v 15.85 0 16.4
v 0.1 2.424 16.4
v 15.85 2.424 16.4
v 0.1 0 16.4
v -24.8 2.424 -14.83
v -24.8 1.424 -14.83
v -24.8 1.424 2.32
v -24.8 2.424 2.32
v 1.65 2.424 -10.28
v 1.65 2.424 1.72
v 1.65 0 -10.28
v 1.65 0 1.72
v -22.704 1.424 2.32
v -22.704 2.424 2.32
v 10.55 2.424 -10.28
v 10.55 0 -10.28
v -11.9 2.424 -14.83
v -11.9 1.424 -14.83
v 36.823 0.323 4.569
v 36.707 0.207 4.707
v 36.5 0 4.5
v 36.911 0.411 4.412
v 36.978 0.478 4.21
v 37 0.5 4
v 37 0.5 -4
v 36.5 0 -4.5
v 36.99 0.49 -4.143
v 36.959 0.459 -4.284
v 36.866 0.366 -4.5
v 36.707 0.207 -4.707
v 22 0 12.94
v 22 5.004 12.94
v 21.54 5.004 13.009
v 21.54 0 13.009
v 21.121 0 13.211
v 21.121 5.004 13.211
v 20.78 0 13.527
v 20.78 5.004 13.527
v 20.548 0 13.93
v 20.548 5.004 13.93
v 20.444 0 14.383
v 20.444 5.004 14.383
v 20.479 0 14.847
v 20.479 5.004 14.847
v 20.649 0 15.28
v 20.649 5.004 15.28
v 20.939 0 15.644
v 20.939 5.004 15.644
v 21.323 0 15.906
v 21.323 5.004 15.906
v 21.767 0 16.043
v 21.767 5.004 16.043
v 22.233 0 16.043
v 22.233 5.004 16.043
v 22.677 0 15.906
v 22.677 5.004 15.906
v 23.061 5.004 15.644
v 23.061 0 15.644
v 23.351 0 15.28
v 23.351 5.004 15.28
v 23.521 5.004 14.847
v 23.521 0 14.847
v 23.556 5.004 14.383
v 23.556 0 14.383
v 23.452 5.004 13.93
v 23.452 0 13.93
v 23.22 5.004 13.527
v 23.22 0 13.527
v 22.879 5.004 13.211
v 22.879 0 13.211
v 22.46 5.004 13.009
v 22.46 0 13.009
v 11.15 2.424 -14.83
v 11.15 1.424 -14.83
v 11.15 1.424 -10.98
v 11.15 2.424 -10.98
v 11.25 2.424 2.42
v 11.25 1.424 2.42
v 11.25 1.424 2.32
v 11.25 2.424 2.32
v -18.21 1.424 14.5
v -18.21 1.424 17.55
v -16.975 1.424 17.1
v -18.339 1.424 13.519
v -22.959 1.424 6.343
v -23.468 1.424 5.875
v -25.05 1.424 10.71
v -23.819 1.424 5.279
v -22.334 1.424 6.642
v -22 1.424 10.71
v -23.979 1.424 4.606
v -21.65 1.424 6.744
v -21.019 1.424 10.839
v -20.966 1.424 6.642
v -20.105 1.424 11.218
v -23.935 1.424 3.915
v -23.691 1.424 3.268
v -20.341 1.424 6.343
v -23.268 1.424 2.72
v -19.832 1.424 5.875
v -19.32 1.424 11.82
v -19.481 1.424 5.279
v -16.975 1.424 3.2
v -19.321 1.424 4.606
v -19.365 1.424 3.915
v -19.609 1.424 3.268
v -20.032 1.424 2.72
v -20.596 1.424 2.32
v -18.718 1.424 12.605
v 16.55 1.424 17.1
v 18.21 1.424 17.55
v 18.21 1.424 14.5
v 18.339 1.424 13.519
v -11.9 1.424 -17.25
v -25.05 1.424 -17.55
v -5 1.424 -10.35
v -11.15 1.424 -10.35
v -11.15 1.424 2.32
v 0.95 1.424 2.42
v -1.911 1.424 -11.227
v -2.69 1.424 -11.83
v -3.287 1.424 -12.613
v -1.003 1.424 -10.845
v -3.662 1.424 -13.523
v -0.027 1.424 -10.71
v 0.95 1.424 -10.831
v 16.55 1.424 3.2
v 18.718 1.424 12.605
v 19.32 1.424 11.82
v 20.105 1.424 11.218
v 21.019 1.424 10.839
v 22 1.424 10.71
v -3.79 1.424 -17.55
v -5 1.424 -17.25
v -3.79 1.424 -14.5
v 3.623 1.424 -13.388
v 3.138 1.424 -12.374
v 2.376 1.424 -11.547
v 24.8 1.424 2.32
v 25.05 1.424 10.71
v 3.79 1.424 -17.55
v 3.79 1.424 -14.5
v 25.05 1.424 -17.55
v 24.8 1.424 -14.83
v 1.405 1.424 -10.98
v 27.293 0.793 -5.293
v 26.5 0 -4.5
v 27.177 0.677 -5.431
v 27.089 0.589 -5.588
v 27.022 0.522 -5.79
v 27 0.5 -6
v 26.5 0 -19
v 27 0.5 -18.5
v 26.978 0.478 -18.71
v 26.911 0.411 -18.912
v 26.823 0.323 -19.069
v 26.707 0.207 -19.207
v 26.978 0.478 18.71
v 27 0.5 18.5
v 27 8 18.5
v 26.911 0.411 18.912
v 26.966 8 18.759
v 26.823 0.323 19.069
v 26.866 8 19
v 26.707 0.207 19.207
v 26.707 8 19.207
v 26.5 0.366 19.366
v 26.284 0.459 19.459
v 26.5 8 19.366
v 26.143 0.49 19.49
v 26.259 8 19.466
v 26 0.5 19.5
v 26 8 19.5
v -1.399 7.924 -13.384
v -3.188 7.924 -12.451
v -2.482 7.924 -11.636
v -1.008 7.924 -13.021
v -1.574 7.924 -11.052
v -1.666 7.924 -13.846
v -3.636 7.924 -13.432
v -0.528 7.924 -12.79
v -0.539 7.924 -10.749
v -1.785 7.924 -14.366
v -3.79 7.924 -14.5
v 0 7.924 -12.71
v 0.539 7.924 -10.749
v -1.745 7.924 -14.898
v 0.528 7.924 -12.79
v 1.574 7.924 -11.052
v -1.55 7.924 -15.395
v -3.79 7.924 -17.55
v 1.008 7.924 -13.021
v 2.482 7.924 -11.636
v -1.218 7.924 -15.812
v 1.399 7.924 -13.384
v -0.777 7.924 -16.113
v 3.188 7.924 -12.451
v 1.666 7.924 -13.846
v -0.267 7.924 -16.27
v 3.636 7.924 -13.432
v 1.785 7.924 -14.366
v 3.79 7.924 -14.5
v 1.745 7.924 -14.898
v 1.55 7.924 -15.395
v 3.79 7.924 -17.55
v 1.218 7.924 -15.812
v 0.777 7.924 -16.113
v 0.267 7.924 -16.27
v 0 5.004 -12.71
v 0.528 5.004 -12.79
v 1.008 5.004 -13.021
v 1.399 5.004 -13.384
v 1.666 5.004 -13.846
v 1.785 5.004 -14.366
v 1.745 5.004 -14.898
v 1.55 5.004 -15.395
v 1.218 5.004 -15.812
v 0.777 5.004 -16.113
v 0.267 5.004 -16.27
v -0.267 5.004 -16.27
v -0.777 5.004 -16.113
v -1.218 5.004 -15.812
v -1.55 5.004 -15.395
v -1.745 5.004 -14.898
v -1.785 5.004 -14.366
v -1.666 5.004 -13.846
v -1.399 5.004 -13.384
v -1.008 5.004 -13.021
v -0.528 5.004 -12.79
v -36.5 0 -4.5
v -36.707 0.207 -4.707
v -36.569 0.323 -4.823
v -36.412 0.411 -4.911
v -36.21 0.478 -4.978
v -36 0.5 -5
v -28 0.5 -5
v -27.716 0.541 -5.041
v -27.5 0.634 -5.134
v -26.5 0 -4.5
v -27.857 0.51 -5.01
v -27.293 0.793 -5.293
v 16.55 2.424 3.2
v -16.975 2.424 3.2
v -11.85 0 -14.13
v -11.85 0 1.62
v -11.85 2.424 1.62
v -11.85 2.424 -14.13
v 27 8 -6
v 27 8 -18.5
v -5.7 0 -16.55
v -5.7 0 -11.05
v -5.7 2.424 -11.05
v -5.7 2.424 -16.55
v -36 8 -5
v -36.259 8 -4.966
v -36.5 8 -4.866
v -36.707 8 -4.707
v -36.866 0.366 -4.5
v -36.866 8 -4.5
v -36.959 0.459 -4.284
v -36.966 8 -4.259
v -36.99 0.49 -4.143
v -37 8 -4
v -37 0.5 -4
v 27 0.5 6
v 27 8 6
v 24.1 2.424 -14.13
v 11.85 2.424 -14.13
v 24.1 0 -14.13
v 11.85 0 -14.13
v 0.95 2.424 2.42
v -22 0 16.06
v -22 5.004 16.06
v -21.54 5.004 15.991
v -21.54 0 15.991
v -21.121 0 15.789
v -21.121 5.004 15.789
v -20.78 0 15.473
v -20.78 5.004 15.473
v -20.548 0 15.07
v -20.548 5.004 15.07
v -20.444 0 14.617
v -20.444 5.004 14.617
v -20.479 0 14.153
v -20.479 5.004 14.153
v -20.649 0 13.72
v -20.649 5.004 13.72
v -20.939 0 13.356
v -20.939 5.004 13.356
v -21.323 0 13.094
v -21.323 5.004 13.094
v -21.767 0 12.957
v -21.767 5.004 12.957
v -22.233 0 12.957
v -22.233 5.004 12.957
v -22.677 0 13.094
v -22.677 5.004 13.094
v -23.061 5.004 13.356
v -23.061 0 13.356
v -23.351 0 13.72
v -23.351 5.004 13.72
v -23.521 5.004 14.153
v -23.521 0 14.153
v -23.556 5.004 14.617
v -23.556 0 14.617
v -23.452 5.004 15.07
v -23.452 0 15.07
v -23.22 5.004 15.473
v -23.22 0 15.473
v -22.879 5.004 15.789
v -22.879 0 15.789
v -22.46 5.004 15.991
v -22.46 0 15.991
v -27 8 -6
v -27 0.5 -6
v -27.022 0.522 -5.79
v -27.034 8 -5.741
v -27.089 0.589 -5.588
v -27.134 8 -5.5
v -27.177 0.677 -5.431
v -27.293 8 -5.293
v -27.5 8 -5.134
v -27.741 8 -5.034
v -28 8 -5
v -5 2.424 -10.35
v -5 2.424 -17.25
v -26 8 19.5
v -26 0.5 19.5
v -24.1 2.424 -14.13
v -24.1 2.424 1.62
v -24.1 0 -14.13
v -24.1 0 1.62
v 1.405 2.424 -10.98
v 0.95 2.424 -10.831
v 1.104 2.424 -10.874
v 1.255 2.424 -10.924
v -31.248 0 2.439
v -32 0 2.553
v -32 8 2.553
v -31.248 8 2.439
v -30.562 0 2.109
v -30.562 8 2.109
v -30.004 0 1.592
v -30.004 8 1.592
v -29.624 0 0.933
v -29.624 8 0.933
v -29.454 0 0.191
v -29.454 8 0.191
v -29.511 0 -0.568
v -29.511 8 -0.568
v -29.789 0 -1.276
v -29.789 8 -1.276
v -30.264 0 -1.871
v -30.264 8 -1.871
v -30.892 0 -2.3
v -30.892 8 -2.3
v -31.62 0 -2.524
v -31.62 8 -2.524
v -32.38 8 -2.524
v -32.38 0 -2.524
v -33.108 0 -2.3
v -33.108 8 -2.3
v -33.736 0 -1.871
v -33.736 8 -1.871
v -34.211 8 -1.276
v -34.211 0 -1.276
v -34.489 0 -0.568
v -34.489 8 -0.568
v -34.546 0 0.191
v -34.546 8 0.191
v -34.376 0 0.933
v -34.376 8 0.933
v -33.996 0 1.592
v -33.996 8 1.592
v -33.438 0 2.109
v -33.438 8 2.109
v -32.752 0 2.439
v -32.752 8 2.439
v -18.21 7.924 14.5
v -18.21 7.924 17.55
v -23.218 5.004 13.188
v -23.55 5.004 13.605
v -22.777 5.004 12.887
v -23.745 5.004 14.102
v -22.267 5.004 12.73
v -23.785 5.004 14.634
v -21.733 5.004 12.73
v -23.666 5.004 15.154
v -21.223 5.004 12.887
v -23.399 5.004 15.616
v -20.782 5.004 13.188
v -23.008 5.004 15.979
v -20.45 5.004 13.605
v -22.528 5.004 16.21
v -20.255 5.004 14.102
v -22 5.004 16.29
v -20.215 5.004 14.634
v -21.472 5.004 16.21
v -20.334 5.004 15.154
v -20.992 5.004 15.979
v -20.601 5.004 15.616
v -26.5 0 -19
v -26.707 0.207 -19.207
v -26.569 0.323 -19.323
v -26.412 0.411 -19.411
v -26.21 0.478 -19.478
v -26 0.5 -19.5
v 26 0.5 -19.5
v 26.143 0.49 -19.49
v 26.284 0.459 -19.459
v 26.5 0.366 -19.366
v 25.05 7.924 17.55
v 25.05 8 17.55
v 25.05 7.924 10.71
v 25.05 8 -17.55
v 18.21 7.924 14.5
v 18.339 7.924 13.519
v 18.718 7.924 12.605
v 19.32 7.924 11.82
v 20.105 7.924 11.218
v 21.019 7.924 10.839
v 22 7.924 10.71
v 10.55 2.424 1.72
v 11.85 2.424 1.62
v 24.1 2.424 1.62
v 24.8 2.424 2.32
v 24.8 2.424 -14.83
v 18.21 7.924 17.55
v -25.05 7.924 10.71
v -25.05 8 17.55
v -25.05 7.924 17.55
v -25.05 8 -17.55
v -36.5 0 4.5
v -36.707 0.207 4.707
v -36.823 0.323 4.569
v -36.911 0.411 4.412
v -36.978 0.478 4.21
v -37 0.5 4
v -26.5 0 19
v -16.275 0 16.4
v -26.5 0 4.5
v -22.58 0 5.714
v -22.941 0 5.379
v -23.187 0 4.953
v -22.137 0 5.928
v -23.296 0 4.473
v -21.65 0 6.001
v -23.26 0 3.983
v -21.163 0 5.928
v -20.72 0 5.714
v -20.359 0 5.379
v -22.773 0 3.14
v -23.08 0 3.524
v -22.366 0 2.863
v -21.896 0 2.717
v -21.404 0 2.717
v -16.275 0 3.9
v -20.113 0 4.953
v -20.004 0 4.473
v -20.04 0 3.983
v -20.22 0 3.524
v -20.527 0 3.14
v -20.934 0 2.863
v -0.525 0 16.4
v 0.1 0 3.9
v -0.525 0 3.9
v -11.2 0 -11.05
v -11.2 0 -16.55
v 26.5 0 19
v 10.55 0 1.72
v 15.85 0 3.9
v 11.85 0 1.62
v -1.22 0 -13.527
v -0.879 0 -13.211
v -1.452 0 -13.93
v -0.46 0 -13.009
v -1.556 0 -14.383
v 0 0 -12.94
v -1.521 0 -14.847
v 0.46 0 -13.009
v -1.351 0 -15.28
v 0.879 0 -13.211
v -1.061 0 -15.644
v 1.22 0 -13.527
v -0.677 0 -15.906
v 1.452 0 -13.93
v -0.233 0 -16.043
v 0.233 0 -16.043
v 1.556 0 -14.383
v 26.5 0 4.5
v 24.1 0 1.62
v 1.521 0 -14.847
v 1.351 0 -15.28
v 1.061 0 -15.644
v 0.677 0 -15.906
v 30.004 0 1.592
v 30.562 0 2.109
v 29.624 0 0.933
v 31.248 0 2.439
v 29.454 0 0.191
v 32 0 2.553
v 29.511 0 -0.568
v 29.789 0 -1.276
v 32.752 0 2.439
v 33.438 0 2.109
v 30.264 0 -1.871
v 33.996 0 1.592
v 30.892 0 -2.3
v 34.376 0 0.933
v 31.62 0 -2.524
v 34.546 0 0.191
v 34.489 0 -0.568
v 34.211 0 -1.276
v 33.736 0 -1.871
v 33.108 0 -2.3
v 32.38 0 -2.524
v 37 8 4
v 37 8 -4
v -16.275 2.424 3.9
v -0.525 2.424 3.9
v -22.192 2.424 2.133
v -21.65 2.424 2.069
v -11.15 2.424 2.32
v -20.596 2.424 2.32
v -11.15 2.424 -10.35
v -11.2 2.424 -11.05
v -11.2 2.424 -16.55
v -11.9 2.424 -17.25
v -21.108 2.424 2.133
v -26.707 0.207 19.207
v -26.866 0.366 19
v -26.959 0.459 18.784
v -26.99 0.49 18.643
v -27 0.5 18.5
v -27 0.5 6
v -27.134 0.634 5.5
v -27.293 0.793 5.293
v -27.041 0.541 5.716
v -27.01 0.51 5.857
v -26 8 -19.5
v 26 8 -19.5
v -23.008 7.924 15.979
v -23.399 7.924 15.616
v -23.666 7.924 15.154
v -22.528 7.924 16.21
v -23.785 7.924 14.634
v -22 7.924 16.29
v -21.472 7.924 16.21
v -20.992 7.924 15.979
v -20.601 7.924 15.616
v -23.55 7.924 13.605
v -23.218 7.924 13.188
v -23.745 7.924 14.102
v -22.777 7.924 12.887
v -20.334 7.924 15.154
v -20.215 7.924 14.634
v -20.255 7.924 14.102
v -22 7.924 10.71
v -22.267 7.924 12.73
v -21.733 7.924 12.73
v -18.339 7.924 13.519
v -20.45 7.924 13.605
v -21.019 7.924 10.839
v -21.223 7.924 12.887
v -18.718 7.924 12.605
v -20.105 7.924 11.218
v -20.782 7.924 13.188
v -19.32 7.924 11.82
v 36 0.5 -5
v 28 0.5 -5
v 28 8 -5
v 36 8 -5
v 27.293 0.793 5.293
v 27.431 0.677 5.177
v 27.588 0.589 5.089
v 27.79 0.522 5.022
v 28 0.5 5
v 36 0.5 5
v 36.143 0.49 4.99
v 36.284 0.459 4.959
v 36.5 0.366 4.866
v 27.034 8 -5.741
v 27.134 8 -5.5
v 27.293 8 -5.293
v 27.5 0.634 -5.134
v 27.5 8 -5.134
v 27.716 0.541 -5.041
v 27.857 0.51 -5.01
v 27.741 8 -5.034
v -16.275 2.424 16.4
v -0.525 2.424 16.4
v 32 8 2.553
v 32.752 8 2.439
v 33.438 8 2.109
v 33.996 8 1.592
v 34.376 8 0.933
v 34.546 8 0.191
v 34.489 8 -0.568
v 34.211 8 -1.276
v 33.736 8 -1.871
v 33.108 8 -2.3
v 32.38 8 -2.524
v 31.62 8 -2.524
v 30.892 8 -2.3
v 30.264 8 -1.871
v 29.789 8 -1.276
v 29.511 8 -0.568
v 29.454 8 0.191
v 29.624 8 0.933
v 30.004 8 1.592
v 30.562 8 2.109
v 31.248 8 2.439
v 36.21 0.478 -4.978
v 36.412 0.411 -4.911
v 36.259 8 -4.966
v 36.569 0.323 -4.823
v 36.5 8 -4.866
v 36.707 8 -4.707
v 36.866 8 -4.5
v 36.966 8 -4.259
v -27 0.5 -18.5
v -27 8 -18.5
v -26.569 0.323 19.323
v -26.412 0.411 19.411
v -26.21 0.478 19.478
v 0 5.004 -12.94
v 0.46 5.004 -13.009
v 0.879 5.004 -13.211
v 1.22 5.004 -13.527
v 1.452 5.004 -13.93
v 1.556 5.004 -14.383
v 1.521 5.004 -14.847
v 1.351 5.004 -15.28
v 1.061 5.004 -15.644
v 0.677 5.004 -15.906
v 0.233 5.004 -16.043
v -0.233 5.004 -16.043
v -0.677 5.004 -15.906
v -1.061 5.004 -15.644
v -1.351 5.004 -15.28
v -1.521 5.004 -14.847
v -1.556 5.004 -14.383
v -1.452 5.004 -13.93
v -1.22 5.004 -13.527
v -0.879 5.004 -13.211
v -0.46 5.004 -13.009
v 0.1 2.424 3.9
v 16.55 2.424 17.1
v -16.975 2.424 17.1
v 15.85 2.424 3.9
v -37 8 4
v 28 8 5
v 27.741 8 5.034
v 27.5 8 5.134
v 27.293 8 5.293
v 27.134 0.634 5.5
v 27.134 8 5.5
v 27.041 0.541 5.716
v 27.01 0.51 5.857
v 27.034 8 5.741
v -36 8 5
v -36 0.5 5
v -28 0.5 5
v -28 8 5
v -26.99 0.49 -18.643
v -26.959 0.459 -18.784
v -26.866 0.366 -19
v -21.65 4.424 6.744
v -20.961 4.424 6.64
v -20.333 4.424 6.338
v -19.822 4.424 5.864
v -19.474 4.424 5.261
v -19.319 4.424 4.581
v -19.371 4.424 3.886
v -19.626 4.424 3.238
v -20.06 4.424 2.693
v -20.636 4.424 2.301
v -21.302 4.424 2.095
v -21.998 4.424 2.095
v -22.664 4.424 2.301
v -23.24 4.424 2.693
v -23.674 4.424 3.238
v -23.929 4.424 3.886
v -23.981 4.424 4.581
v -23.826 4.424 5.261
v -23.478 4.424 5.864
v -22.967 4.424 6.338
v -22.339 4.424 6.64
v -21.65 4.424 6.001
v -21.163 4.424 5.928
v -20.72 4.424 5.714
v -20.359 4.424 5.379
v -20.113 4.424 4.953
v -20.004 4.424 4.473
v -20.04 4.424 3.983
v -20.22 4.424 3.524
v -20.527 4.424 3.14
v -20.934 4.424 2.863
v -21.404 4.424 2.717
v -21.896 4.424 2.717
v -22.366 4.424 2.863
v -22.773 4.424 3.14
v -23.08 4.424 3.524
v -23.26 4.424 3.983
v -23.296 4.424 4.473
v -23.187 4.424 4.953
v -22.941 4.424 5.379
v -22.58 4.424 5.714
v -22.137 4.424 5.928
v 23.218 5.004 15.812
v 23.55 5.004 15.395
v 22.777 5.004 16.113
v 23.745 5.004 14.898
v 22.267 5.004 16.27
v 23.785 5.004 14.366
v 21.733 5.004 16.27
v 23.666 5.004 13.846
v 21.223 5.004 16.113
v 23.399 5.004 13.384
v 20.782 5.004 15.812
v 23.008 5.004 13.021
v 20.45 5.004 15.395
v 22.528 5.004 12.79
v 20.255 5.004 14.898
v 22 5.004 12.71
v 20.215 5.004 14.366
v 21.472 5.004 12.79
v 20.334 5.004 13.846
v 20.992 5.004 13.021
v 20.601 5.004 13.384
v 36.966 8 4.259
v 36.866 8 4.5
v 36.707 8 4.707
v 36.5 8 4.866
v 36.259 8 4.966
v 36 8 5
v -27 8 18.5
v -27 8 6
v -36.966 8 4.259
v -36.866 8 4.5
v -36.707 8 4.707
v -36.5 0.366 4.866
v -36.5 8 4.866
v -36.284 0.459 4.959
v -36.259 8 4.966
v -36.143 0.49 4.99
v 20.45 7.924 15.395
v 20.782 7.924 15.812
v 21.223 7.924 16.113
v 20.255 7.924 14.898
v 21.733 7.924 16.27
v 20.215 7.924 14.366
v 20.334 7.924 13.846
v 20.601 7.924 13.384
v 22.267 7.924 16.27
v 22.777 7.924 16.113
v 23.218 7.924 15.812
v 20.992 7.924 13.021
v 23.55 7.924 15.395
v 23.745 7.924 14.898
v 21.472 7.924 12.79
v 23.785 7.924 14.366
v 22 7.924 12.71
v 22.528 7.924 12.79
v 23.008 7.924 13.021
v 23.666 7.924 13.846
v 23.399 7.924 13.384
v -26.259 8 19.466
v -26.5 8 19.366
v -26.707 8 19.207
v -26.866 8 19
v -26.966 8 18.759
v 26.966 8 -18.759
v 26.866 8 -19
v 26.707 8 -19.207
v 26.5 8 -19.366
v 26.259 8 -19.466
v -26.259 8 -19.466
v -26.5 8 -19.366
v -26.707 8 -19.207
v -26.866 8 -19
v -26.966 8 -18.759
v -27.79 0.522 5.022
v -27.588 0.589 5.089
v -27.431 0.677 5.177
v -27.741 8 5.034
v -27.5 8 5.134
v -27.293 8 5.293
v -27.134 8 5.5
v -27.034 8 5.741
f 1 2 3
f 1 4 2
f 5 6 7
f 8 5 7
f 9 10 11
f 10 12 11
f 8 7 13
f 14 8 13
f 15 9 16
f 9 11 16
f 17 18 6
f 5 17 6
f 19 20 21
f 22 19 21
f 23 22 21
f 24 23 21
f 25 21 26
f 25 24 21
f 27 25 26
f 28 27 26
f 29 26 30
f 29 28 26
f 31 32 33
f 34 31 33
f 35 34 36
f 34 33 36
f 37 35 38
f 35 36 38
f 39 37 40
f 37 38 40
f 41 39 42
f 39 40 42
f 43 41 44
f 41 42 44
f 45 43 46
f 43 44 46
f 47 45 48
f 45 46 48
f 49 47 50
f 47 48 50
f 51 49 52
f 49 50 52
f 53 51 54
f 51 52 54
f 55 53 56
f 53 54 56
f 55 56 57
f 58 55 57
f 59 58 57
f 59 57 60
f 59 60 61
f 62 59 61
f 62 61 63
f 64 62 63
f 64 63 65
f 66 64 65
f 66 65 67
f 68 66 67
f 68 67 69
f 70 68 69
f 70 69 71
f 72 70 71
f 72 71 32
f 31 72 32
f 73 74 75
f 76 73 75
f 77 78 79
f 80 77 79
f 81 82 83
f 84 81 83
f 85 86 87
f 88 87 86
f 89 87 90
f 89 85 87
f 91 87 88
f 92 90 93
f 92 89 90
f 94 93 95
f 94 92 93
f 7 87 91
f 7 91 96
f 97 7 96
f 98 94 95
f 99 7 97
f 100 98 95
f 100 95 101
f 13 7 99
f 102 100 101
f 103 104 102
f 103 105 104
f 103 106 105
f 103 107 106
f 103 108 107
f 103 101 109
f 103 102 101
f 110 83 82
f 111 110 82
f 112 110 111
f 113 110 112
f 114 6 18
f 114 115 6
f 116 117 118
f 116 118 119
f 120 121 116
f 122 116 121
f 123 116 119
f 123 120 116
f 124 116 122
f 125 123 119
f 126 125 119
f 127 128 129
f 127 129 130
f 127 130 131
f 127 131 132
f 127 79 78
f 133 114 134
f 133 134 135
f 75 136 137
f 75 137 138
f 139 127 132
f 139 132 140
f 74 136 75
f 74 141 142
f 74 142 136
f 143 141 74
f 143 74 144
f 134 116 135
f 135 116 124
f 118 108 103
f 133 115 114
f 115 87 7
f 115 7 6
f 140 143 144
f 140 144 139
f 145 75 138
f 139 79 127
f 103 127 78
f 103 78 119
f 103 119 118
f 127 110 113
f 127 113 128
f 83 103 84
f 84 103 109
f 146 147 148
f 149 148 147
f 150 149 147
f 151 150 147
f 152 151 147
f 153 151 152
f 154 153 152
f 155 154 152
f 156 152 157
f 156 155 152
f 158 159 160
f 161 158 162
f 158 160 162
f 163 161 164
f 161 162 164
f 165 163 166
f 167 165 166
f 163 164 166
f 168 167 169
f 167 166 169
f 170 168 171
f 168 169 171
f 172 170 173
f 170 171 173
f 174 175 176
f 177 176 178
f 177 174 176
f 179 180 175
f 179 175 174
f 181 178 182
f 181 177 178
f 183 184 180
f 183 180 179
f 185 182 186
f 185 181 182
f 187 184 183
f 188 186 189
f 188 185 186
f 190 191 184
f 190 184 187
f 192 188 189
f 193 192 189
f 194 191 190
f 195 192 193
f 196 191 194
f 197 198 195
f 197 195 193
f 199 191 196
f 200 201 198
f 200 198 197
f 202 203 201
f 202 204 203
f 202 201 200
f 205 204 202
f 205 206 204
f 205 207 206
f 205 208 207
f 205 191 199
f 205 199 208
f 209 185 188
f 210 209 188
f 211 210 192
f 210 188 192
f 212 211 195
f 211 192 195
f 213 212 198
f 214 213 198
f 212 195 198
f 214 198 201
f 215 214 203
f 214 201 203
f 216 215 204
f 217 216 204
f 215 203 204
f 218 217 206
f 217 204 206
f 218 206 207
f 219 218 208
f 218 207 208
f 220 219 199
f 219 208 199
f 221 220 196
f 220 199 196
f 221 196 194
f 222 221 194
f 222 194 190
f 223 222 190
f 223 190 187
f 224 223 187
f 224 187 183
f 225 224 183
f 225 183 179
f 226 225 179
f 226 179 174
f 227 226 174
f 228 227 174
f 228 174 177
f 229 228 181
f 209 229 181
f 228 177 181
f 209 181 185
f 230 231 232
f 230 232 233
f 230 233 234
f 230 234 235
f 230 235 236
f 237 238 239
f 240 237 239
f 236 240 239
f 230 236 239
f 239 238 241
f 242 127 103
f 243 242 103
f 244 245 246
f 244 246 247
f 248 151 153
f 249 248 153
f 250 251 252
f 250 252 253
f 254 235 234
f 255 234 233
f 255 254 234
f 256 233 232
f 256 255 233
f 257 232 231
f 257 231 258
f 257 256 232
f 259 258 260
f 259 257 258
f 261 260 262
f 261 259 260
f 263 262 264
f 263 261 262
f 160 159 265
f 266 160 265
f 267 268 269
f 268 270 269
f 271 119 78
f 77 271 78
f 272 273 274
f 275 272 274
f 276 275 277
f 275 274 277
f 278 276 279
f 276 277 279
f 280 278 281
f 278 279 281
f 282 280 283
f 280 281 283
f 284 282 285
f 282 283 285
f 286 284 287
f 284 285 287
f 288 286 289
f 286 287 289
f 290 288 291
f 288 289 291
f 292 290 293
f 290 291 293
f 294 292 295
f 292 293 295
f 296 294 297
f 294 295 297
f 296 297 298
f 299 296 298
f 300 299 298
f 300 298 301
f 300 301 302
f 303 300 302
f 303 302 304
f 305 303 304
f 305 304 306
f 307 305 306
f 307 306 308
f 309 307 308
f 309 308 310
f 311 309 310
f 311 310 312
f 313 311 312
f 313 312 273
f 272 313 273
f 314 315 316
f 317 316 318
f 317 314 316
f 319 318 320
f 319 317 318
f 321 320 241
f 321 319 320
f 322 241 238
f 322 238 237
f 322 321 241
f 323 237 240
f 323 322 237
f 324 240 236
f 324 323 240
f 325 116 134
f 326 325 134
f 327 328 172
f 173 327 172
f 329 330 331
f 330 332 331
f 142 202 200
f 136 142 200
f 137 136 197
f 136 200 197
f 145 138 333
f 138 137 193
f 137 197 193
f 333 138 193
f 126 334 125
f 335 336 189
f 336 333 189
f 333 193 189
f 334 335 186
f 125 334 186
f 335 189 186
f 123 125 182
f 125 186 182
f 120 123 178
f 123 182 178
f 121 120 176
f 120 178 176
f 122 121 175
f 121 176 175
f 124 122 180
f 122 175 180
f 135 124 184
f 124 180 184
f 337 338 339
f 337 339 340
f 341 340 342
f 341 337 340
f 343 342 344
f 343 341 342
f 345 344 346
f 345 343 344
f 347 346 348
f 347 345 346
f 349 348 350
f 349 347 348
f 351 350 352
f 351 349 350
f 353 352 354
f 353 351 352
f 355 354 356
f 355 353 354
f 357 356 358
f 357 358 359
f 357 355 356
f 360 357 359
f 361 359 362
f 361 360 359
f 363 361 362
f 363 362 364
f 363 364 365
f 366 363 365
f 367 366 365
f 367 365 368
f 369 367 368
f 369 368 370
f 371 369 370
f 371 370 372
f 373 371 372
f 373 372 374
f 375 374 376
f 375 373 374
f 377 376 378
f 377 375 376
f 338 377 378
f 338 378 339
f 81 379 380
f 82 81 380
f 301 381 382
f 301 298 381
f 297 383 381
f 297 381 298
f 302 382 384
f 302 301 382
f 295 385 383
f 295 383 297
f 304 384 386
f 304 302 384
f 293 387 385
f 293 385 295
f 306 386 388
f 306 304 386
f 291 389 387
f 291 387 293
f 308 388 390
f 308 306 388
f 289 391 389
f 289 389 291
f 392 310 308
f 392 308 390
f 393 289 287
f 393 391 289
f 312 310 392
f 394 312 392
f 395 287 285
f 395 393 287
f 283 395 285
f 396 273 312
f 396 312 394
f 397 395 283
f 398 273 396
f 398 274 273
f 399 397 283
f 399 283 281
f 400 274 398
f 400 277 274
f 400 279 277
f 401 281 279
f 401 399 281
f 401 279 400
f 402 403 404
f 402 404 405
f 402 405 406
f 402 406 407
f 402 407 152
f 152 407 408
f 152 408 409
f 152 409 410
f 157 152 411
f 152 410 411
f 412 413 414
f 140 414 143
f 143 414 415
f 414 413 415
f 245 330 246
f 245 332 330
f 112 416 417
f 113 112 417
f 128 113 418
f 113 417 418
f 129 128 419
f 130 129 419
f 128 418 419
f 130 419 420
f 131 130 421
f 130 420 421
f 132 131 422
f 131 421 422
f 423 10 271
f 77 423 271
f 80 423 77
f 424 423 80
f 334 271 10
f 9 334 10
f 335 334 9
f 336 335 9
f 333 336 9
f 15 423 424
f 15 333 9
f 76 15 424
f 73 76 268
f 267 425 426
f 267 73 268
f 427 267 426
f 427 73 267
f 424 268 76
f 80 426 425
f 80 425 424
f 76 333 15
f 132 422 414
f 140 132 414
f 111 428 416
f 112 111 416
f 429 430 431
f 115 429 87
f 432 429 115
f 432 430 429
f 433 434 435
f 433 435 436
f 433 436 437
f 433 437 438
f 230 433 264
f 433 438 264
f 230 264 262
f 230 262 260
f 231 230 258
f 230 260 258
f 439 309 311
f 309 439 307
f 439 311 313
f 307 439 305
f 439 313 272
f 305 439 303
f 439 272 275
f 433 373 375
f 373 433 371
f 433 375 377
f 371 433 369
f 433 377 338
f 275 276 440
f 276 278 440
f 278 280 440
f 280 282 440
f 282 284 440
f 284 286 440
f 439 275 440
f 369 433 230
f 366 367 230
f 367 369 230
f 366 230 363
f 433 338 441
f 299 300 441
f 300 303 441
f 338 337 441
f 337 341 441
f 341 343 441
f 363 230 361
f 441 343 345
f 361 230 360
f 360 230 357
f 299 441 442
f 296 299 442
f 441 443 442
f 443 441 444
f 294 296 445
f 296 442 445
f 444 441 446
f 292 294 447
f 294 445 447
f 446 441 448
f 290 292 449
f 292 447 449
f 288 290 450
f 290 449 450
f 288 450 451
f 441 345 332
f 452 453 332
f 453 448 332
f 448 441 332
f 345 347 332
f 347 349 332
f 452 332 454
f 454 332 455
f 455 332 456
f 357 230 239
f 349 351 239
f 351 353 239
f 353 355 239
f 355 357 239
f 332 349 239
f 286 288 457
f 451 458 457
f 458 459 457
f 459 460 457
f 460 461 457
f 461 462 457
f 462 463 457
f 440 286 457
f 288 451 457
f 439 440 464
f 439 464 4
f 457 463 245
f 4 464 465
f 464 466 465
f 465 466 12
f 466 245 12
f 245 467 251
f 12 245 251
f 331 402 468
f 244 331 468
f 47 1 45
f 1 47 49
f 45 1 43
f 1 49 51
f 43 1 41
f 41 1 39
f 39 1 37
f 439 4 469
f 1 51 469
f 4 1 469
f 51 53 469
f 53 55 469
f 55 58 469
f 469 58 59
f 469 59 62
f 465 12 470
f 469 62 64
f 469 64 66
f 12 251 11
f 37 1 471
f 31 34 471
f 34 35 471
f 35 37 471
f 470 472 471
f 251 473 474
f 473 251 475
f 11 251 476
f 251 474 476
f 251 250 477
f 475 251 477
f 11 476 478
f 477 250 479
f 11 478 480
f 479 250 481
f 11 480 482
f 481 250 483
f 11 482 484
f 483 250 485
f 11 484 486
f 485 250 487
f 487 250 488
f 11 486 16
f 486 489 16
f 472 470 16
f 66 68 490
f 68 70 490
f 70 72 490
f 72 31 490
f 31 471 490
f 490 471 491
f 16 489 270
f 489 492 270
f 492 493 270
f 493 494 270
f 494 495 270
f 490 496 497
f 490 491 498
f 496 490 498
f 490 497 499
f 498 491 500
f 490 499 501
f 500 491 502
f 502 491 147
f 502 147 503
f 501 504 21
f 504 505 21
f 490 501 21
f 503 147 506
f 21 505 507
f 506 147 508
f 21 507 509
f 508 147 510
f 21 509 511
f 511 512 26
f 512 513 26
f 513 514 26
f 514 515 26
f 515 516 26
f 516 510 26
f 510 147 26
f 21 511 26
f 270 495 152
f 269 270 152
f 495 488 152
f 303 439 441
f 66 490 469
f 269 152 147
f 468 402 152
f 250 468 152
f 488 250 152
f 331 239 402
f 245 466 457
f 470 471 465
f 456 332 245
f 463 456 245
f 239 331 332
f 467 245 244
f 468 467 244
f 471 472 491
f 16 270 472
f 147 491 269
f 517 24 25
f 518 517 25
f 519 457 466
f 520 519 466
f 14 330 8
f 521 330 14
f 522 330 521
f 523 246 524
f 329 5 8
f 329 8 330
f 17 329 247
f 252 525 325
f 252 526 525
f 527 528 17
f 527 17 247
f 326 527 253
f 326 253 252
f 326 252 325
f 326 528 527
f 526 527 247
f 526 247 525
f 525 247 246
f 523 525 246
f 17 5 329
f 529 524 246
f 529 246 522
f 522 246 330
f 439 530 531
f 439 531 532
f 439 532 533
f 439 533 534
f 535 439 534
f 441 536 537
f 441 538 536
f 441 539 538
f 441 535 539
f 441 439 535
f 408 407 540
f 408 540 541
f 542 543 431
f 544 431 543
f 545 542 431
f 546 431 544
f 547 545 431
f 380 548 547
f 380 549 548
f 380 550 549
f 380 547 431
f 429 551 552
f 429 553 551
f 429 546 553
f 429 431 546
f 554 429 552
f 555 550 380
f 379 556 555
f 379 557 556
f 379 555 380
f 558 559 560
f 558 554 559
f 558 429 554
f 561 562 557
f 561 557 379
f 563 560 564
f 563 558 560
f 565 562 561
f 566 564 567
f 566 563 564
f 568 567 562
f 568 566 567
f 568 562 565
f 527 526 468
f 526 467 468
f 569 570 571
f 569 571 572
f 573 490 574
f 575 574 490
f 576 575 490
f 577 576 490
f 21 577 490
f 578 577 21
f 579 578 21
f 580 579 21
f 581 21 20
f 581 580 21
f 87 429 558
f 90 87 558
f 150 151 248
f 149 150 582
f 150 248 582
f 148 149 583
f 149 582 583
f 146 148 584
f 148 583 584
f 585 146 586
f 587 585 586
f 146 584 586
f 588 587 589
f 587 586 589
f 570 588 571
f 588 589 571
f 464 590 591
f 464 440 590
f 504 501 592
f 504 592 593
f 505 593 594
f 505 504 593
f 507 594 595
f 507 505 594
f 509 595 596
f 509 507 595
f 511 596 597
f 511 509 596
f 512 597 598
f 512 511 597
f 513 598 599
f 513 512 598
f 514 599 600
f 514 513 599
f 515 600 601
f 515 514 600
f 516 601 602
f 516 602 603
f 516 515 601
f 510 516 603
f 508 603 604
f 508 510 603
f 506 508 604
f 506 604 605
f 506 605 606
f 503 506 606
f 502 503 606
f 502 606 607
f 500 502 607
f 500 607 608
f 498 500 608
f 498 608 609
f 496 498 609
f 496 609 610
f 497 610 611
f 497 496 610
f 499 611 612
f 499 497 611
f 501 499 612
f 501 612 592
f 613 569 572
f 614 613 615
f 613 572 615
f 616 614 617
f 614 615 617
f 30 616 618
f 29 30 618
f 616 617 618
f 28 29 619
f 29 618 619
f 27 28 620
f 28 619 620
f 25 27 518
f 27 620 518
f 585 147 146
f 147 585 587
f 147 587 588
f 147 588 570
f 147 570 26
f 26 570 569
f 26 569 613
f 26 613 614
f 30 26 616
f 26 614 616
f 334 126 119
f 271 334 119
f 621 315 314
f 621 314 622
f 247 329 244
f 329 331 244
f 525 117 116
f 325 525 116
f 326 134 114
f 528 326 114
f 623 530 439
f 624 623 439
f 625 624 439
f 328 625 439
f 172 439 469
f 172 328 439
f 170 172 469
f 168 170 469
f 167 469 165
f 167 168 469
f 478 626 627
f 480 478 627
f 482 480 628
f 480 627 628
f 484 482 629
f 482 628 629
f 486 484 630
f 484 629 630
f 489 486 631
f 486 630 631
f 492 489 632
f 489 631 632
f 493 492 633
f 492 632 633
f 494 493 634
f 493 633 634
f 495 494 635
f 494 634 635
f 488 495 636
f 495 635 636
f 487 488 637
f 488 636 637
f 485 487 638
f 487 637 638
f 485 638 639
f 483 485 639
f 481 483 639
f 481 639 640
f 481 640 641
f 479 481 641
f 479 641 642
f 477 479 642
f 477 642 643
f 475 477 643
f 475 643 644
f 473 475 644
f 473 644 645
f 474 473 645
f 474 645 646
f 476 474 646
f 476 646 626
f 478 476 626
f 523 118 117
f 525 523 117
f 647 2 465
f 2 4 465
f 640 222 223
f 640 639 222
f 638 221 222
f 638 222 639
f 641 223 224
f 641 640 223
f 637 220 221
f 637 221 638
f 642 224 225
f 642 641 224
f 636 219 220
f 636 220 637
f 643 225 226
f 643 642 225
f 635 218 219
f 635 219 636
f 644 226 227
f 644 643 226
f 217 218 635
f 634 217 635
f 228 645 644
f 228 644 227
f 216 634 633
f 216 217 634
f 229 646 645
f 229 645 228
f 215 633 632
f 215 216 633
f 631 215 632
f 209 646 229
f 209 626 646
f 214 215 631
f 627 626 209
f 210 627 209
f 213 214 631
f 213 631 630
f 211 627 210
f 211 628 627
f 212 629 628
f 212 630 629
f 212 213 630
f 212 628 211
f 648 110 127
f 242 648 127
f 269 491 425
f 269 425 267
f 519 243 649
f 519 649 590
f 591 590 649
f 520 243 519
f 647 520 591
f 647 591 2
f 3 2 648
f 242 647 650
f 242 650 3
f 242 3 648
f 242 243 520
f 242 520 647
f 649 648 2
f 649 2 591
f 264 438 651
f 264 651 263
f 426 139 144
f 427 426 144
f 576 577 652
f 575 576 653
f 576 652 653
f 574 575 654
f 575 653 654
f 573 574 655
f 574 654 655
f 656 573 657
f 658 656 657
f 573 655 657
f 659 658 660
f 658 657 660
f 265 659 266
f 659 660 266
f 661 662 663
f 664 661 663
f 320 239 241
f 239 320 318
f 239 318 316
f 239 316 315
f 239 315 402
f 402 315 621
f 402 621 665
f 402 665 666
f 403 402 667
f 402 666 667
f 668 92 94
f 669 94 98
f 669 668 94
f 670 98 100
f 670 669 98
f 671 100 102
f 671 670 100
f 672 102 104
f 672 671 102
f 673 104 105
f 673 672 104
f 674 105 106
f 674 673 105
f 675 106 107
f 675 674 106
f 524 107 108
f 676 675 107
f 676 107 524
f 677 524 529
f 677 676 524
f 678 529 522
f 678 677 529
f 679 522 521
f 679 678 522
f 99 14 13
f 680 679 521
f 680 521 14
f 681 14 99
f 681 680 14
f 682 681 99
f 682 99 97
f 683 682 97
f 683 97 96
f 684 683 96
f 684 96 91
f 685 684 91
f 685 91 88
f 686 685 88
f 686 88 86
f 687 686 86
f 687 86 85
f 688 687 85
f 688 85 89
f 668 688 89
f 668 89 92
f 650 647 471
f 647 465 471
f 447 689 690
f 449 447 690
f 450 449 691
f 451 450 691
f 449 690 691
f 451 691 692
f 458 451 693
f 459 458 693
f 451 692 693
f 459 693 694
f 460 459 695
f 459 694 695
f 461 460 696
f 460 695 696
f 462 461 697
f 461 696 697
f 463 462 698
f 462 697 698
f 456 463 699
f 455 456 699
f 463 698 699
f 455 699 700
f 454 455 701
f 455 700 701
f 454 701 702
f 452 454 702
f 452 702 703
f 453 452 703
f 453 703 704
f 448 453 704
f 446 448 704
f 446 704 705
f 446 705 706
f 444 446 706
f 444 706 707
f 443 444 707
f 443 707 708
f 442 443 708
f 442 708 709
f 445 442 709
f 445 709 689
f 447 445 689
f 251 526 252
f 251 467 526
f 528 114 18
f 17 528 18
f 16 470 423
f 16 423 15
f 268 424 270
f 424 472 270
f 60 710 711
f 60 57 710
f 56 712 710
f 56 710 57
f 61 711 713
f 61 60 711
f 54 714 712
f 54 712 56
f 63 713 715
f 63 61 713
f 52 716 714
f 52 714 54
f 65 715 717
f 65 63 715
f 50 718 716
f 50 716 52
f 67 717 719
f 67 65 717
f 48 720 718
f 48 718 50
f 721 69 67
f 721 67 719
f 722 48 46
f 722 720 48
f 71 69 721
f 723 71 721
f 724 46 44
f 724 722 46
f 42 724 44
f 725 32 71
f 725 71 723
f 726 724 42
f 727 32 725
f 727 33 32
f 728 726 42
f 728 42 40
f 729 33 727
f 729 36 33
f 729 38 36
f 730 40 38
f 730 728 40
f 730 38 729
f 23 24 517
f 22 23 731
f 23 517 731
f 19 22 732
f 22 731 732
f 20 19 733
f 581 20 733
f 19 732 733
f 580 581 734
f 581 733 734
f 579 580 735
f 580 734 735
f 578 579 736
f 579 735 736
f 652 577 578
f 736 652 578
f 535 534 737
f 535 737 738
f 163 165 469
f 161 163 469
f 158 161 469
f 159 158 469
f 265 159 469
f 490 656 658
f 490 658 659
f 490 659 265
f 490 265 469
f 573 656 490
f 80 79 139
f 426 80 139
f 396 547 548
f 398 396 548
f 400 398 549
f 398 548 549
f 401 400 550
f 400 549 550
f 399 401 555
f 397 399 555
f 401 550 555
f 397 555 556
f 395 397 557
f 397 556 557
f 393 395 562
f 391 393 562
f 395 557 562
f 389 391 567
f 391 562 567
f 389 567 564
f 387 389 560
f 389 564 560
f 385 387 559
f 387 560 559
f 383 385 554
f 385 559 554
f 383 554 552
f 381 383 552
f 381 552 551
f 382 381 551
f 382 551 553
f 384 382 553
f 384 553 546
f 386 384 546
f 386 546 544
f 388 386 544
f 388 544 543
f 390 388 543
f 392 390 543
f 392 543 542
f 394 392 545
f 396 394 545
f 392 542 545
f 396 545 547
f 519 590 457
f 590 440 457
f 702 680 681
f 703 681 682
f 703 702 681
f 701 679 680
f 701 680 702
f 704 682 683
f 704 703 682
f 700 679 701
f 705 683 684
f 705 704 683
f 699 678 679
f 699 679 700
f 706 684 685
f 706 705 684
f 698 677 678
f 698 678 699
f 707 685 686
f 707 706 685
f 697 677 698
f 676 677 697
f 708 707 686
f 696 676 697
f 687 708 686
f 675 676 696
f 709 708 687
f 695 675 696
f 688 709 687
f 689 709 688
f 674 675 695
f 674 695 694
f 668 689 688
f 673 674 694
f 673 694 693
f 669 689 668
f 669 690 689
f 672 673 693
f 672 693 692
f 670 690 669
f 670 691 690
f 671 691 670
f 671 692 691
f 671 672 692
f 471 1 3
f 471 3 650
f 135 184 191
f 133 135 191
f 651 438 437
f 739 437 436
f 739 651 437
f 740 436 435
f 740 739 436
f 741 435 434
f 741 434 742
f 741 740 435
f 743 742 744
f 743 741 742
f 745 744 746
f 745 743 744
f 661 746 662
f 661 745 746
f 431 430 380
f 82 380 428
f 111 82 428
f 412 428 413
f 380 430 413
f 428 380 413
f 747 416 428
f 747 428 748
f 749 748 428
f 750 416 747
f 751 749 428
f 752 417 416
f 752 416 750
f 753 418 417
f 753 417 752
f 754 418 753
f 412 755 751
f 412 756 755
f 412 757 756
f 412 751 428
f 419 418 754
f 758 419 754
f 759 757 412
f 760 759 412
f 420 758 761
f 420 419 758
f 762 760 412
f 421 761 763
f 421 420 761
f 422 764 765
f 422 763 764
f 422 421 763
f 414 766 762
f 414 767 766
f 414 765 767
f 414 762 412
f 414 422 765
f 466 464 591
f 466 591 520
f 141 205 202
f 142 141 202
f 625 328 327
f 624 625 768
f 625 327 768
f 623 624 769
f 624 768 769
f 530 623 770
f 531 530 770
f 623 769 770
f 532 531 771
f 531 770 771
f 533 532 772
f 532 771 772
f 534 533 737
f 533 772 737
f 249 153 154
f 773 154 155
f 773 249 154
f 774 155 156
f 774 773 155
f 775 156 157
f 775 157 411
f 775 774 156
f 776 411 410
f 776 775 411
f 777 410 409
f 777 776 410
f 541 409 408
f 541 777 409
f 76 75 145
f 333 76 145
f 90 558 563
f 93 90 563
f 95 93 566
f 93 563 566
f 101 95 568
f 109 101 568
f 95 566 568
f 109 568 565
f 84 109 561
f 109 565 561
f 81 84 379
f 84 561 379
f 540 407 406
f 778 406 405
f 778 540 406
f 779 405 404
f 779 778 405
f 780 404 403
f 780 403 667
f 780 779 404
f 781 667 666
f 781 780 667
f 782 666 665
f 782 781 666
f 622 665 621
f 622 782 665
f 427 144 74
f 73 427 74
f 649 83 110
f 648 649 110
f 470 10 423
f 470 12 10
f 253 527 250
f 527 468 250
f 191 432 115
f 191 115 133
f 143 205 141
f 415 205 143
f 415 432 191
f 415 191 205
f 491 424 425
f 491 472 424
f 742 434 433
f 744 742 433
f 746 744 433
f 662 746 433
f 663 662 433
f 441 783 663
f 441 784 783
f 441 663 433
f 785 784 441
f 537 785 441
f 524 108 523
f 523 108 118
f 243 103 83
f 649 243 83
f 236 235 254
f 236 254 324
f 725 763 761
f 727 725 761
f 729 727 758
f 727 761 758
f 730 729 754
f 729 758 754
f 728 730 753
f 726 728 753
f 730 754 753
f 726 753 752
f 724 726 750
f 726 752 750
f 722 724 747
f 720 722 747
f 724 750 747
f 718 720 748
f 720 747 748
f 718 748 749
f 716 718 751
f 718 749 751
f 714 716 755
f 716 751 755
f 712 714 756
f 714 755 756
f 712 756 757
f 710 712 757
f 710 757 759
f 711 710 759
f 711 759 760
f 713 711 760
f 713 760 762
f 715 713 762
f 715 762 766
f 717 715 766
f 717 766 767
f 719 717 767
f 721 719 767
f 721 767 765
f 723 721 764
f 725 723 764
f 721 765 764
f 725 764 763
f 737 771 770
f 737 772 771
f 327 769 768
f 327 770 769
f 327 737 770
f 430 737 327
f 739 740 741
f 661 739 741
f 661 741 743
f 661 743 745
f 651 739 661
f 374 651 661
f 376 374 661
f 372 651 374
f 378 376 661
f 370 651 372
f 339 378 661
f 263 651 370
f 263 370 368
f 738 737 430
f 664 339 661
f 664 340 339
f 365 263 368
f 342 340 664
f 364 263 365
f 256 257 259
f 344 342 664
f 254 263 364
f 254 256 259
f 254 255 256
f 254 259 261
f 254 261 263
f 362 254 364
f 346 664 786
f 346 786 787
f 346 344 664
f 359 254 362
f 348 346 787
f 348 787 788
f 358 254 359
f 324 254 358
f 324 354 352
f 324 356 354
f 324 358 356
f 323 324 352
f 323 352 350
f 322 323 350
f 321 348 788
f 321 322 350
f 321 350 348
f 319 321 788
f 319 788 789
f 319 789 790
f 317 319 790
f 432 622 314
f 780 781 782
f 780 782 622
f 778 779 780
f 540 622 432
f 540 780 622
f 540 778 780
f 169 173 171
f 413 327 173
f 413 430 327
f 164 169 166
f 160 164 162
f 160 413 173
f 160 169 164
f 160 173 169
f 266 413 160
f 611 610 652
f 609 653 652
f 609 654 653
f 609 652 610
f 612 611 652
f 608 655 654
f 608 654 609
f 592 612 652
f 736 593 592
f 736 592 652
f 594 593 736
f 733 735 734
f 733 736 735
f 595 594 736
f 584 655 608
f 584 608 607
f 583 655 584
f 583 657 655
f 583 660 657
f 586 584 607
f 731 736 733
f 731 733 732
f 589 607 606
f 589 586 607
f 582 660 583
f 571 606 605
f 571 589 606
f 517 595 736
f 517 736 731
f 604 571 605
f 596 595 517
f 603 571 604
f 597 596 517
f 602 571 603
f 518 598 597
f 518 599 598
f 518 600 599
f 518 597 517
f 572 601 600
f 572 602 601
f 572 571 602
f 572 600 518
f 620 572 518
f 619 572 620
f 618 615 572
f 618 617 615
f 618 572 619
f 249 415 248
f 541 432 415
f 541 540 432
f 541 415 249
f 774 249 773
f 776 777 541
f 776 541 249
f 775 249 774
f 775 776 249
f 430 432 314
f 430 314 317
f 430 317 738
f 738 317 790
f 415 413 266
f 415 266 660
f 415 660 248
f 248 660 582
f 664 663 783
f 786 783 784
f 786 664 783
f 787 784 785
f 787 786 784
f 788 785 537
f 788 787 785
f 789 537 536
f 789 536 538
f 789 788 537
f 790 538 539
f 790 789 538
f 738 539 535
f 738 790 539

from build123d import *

# Parameters (mm, degrees)
SKETCH1_W           = 54
SKETCH1_H           = 39
SKETCH1_W_2         = 10
SKETCH1_H_2         = 10
SKETCH1_R           = 2.5527
BOSS_EXTRUDE1_DEPTH = 8
SKETCH2_W           = 50.1
SKETCH2_H           = 35.1
CUT_EXTRUDE1_DEPTH  = 0.0762
CUT_EXTRUDE2_DEPTH  = 6.5
SKETCH4_R           = 1.56
CUT_EXTRUDE3_DEPTH  = 43.568023286
SKETCH5_R           = 1.79
CUT_EXTRUDE4_DEPTH  = 2.92
SKETCH6_W           = 12.25
SKETCH6_H           = 15.75
SKETCH6_W_2         = 15.75
SKETCH6_H_2         = 12.5
SKETCH6_W_3         = 5.5
SKETCH6_H_3         = 5.5
CUT_EXTRUDE5_DEPTH  = 43.337883821
SKETCH7_W           = 8.9
SKETCH7_H           = 12
CUT_EXTRUDE6_DEPTH  = 43.337883821
CHAMFER1_SIZE       = 0.5
SKETCH9_R           = 1.651
CUT_EXTRUDE8_DEPTH  = 43.337883821
BOSS_EXTRUDE2_START = 3
SKETCH10_R          = 2.3375
SKETCH10_R_2        = 1.651
BOSS_EXTRUDE2_DEPTH = 3
SKETCH11_W          = 5.5
SKETCH11_H          = 5.5
SKETCH11_W_2        = 12.25
SKETCH11_H_2        = 15.75
SKETCH11_W_3        = 8.9
SKETCH11_H_3        = 12
SKETCH11_W_4        = 15.75
SKETCH11_H_4        = 12.5
BOSS_EXTRUDE3_DEPTH = 1
FILLET1_R           = 1


with BuildPart() as part:
    # Sketch1 → Boss-Extrude1 (new body)
    # profile 1 of 3: a face of its own
    with BuildSketch(Plane(origin=(0, 0, 0), x_dir=(1, 0, 0), z_dir=(0, 1, 0))):
        Rectangle(SKETCH1_W, SKETCH1_H)
    # profile 2 of 3: a face of its own
    with BuildSketch(Plane(origin=(0, 0, 0), x_dir=(1, 0, 0), z_dir=(0, 1, 0))):
        with Locations((32, 0)):
            Rectangle(SKETCH1_W_2, SKETCH1_H_2)
        with Locations(Location((32, 0, 0), (0, 0, 270))):
            Circle(SKETCH1_R, mode=Mode.SUBTRACT)
    # profile 3 of 3: a face of its own
    with BuildSketch(Plane(origin=(0, 0, 0), x_dir=(1, 0, 0), z_dir=(0, 1, 0))):
        with Locations((-32, 0)):
            Rectangle(SKETCH1_W_2, SKETCH1_H_2)
        with Locations(Location((-32, 0, 0), (0, 0, 270))):
            Circle(SKETCH1_R, mode=Mode.SUBTRACT)
    extrude(amount=BOSS_EXTRUDE1_DEPTH)

    # Sketch2 → Cut-Extrude1 (cut)
    with BuildSketch(Plane(origin=(0, 8, 0), x_dir=(1, 0, 0), z_dir=(0, 1, 0))):
        Rectangle(SKETCH2_W, SKETCH2_H)
    extrude(amount=-CUT_EXTRUDE1_DEPTH, mode=Mode.SUBTRACT)

    # Sketch3 → Cut-Extrude2 (cut)
    with BuildSketch(Plane(origin=(0, 7.9238, 0), x_dir=(1, 0, 0), z_dir=(0, 1, 0))):
        with BuildLine():
            Line((-3.79, 14.5), (-3.79, 17.55))
            Line((-3.79, 17.55), (-25.05, 17.55))
            Line((-25.05, 17.55), (-25.05, -10.71))
            Line((-25.05, -10.71), (-22, -10.71))
            ThreePointArc((-22, -10.71), (-19.320065299, -11.820065299), (-18.21, -14.5))
            Line((-18.21, -14.5), (-18.21, -17.55))
            Line((-18.21, -17.55), (18.21, -17.55))
            Line((18.21, -17.55), (18.21, -14.5))
            ThreePointArc((18.21, -14.5), (19.320065299, -11.820065299), (22, -10.71))
            Line((22, -10.71), (25.05, -10.71))
            Line((25.05, -10.71), (25.05, 17.55))
            Line((25.05, 17.55), (3.79, 17.55))
            Line((3.79, 17.55), (3.79, 14.5))
            ThreePointArc((3.79, 14.5), (0, 10.71), (-3.79, 14.5))
        make_face()
    extrude(amount=-CUT_EXTRUDE2_DEPTH, mode=Mode.SUBTRACT)

    # Sketch4 → Cut-Extrude3 (cut, through all)
    with BuildSketch(Plane(origin=(0, 7.9238, 0), x_dir=(1, 0, 0), z_dir=(0, 1, 0))):
        with Locations(Location((0, 14.5, 0), (0, 0, 270))):
            Circle(SKETCH4_R)
        with Locations(Location((-22, -14.5, 0), (0, 0, 270))):
            Circle(SKETCH4_R)
        with Locations(Location((22, -14.5, 0), (0, 0, 90))):
            Circle(SKETCH4_R)
    extrude(amount=-CUT_EXTRUDE3_DEPTH, mode=Mode.SUBTRACT)

    # Sketch5 → Cut-Extrude4 (cut)
    with BuildSketch(Plane(origin=(0, 7.9238, 0), x_dir=(1, 0, 0), z_dir=(0, 1, 0))):
        with Locations(Location((0, 14.5, 0), (0, 0, 270))):
            Circle(SKETCH5_R)
        with Locations(Location((-22, -14.5, 0), (0, 0, 270))):
            Circle(SKETCH5_R)
        with Locations(Location((22, -14.5, 0), (0, 0, 90))):
            Circle(SKETCH5_R)
    extrude(amount=-CUT_EXTRUDE4_DEPTH, mode=Mode.SUBTRACT)

    # Sketch6 → Cut-Extrude5 (cut, through all)
    with BuildSketch(Plane(origin=(0, 1.4238, 0), x_dir=(1, 0, 0), z_dir=(0, 1, 0))):
        with Locations((17.975, 6.255)):
            Rectangle(SKETCH6_W, SKETCH6_H)
        with Locations((7.975, -10.15)):
            Rectangle(SKETCH6_W_2, SKETCH6_H_2)
        with Locations((-17.975, 6.255)):
            Rectangle(SKETCH6_W, SKETCH6_H)
        with Locations((-8.4, -10.15)):
            Rectangle(SKETCH6_W_2, SKETCH6_H_2)
        with Locations((-8.45, 13.8)):
            Rectangle(SKETCH6_W_3, SKETCH6_H_3)
    extrude(amount=-CUT_EXTRUDE5_DEPTH, mode=Mode.SUBTRACT)

    # Sketch7 → Cut-Extrude6 (cut, through all)
    with BuildSketch(Plane(origin=(0, 1.4238, 0), x_dir=(1, 0, 0), z_dir=(0, 1, 0))):
        with Locations((6.1, 4.28)):
            Rectangle(SKETCH7_W, SKETCH7_H)
    extrude(amount=-CUT_EXTRUDE6_DEPTH, mode=Mode.SUBTRACT)

    # Chamfer1
    chamfer1_edges = [part.edges().sort_by_distance(p)[0] for p in [
        (-27, 0, 12.25),
        (-32, 0, 5),
        (-37, 0, 0),
        (-32, 0, -5),
        (-27, 0, -12.25),
        (0, 0, -19.5),
        (27, 0, -12.25),
        (32, 0, -5),
        (37, 0, 0),
        (32, 0, 5),
        (27, 0, 12.25),
        (0, 0, 19.5),
    ]]
    chamfer(chamfer1_edges, length=CHAMFER1_SIZE)

    # Sketch9 → Cut-Extrude8 (cut, through all)
    with BuildSketch(Plane(origin=(0, 1.4238, 0), x_dir=(1, 0, 0), z_dir=(0, 1, 0))):
        with Locations(Location((-21.65, -4.35, 0), (0, 0, 270))):
            Circle(SKETCH9_R)
    extrude(amount=-CUT_EXTRUDE8_DEPTH, mode=Mode.SUBTRACT)

    # Sketch10 → Boss-Extrude2 (add)
    with BuildSketch(Plane(origin=(0, 1.4238, 0), x_dir=(1, 0, 0), z_dir=(0, 1, 0)).offset(BOSS_EXTRUDE2_START)):
        with Locations(Location((-21.65, -4.406538836, 0), (0, 0, 270))):
            Circle(SKETCH10_R)
        with Locations(Location((-21.65, -4.35, 0), (0, 0, 270))):
            Circle(SKETCH10_R_2, mode=Mode.SUBTRACT)
    extrude(amount=-BOSS_EXTRUDE2_DEPTH)

    # Sketch11 → Boss-Extrude3 (add)
    # profile 1 of 3: a face of its own
    with BuildSketch(Plane(origin=(0, 1.4238, 0), x_dir=(1, 0, 0), z_dir=(0, 1, 0))):
        Polygon((-11.15, -2.32), (-11.15, 10.35), (-5, 10.35), (-5, 17.25), (-11.9, 17.25), (-11.9, 14.83), (-24.8, 14.83), (-24.8, -2.32), align=None)
        with Locations((-8.45, 13.8)):
            Rectangle(SKETCH11_W, SKETCH11_H, mode=Mode.SUBTRACT)
        with Locations((-17.975, 6.255)):
            Rectangle(SKETCH11_W_2, SKETCH11_H_2, mode=Mode.SUBTRACT)
    # profile 2 of 3: a face of its own
    with BuildSketch(Plane(origin=(0, 1.4238, 0), x_dir=(1, 0, 0), z_dir=(0, 1, 0))):
        Polygon((0.95, 10.98), (0.95, -2.42), (11.25, -2.42), (11.25, -2.32), (24.8, -2.32), (24.8, 14.83), (11.15, 14.83), (11.15, 10.98), align=None)
        with Locations((17.975, 6.255)):
            Rectangle(SKETCH11_W_2, SKETCH11_H_2, mode=Mode.SUBTRACT)
        with Locations((6.1, 4.28)):
            Rectangle(SKETCH11_W_3, SKETCH11_H_3, mode=Mode.SUBTRACT)
    # profile 3 of 3: a face of its own
    with BuildSketch(Plane(origin=(0, 1.4238, 0), x_dir=(1, 0, 0), z_dir=(0, 1, 0))):
        Polygon((16.55, -3.2), (0.175, -3.2), (-16.975, -3.2), (-16.975, -17.1), (0.175, -17.1), (16.55, -17.1), align=None)
        with Locations((7.975, -10.15)):
            Rectangle(SKETCH11_W_4, SKETCH11_H_4, mode=Mode.SUBTRACT)
        with Locations((-8.4, -10.15)):
            Rectangle(SKETCH11_W_4, SKETCH11_H_4, mode=Mode.SUBTRACT)
    extrude(amount=BOSS_EXTRUDE3_DEPTH)

    # Fillet1
    fillet1_edges = [part.edges().sort_by_distance(p)[0] for p in [
        (-27, 4.25, 19.5),
        (-27, 4.25, 5),
        (-37, 4.25, 5),
        (-37, 4.25, -5),
        (-27, 4.25, -5),
        (-27, 4.25, -19.5),
        (27, 4.25, -19.5),
        (27, 4.25, -5),
        (37, 4.25, -5),
        (37, 4.25, 5),
        (27, 4.25, 5),
        (27, 4.25, 19.5),
    ]]
    fillet(fillet1_edges, radius=FILLET1_R)


solid = part.part
